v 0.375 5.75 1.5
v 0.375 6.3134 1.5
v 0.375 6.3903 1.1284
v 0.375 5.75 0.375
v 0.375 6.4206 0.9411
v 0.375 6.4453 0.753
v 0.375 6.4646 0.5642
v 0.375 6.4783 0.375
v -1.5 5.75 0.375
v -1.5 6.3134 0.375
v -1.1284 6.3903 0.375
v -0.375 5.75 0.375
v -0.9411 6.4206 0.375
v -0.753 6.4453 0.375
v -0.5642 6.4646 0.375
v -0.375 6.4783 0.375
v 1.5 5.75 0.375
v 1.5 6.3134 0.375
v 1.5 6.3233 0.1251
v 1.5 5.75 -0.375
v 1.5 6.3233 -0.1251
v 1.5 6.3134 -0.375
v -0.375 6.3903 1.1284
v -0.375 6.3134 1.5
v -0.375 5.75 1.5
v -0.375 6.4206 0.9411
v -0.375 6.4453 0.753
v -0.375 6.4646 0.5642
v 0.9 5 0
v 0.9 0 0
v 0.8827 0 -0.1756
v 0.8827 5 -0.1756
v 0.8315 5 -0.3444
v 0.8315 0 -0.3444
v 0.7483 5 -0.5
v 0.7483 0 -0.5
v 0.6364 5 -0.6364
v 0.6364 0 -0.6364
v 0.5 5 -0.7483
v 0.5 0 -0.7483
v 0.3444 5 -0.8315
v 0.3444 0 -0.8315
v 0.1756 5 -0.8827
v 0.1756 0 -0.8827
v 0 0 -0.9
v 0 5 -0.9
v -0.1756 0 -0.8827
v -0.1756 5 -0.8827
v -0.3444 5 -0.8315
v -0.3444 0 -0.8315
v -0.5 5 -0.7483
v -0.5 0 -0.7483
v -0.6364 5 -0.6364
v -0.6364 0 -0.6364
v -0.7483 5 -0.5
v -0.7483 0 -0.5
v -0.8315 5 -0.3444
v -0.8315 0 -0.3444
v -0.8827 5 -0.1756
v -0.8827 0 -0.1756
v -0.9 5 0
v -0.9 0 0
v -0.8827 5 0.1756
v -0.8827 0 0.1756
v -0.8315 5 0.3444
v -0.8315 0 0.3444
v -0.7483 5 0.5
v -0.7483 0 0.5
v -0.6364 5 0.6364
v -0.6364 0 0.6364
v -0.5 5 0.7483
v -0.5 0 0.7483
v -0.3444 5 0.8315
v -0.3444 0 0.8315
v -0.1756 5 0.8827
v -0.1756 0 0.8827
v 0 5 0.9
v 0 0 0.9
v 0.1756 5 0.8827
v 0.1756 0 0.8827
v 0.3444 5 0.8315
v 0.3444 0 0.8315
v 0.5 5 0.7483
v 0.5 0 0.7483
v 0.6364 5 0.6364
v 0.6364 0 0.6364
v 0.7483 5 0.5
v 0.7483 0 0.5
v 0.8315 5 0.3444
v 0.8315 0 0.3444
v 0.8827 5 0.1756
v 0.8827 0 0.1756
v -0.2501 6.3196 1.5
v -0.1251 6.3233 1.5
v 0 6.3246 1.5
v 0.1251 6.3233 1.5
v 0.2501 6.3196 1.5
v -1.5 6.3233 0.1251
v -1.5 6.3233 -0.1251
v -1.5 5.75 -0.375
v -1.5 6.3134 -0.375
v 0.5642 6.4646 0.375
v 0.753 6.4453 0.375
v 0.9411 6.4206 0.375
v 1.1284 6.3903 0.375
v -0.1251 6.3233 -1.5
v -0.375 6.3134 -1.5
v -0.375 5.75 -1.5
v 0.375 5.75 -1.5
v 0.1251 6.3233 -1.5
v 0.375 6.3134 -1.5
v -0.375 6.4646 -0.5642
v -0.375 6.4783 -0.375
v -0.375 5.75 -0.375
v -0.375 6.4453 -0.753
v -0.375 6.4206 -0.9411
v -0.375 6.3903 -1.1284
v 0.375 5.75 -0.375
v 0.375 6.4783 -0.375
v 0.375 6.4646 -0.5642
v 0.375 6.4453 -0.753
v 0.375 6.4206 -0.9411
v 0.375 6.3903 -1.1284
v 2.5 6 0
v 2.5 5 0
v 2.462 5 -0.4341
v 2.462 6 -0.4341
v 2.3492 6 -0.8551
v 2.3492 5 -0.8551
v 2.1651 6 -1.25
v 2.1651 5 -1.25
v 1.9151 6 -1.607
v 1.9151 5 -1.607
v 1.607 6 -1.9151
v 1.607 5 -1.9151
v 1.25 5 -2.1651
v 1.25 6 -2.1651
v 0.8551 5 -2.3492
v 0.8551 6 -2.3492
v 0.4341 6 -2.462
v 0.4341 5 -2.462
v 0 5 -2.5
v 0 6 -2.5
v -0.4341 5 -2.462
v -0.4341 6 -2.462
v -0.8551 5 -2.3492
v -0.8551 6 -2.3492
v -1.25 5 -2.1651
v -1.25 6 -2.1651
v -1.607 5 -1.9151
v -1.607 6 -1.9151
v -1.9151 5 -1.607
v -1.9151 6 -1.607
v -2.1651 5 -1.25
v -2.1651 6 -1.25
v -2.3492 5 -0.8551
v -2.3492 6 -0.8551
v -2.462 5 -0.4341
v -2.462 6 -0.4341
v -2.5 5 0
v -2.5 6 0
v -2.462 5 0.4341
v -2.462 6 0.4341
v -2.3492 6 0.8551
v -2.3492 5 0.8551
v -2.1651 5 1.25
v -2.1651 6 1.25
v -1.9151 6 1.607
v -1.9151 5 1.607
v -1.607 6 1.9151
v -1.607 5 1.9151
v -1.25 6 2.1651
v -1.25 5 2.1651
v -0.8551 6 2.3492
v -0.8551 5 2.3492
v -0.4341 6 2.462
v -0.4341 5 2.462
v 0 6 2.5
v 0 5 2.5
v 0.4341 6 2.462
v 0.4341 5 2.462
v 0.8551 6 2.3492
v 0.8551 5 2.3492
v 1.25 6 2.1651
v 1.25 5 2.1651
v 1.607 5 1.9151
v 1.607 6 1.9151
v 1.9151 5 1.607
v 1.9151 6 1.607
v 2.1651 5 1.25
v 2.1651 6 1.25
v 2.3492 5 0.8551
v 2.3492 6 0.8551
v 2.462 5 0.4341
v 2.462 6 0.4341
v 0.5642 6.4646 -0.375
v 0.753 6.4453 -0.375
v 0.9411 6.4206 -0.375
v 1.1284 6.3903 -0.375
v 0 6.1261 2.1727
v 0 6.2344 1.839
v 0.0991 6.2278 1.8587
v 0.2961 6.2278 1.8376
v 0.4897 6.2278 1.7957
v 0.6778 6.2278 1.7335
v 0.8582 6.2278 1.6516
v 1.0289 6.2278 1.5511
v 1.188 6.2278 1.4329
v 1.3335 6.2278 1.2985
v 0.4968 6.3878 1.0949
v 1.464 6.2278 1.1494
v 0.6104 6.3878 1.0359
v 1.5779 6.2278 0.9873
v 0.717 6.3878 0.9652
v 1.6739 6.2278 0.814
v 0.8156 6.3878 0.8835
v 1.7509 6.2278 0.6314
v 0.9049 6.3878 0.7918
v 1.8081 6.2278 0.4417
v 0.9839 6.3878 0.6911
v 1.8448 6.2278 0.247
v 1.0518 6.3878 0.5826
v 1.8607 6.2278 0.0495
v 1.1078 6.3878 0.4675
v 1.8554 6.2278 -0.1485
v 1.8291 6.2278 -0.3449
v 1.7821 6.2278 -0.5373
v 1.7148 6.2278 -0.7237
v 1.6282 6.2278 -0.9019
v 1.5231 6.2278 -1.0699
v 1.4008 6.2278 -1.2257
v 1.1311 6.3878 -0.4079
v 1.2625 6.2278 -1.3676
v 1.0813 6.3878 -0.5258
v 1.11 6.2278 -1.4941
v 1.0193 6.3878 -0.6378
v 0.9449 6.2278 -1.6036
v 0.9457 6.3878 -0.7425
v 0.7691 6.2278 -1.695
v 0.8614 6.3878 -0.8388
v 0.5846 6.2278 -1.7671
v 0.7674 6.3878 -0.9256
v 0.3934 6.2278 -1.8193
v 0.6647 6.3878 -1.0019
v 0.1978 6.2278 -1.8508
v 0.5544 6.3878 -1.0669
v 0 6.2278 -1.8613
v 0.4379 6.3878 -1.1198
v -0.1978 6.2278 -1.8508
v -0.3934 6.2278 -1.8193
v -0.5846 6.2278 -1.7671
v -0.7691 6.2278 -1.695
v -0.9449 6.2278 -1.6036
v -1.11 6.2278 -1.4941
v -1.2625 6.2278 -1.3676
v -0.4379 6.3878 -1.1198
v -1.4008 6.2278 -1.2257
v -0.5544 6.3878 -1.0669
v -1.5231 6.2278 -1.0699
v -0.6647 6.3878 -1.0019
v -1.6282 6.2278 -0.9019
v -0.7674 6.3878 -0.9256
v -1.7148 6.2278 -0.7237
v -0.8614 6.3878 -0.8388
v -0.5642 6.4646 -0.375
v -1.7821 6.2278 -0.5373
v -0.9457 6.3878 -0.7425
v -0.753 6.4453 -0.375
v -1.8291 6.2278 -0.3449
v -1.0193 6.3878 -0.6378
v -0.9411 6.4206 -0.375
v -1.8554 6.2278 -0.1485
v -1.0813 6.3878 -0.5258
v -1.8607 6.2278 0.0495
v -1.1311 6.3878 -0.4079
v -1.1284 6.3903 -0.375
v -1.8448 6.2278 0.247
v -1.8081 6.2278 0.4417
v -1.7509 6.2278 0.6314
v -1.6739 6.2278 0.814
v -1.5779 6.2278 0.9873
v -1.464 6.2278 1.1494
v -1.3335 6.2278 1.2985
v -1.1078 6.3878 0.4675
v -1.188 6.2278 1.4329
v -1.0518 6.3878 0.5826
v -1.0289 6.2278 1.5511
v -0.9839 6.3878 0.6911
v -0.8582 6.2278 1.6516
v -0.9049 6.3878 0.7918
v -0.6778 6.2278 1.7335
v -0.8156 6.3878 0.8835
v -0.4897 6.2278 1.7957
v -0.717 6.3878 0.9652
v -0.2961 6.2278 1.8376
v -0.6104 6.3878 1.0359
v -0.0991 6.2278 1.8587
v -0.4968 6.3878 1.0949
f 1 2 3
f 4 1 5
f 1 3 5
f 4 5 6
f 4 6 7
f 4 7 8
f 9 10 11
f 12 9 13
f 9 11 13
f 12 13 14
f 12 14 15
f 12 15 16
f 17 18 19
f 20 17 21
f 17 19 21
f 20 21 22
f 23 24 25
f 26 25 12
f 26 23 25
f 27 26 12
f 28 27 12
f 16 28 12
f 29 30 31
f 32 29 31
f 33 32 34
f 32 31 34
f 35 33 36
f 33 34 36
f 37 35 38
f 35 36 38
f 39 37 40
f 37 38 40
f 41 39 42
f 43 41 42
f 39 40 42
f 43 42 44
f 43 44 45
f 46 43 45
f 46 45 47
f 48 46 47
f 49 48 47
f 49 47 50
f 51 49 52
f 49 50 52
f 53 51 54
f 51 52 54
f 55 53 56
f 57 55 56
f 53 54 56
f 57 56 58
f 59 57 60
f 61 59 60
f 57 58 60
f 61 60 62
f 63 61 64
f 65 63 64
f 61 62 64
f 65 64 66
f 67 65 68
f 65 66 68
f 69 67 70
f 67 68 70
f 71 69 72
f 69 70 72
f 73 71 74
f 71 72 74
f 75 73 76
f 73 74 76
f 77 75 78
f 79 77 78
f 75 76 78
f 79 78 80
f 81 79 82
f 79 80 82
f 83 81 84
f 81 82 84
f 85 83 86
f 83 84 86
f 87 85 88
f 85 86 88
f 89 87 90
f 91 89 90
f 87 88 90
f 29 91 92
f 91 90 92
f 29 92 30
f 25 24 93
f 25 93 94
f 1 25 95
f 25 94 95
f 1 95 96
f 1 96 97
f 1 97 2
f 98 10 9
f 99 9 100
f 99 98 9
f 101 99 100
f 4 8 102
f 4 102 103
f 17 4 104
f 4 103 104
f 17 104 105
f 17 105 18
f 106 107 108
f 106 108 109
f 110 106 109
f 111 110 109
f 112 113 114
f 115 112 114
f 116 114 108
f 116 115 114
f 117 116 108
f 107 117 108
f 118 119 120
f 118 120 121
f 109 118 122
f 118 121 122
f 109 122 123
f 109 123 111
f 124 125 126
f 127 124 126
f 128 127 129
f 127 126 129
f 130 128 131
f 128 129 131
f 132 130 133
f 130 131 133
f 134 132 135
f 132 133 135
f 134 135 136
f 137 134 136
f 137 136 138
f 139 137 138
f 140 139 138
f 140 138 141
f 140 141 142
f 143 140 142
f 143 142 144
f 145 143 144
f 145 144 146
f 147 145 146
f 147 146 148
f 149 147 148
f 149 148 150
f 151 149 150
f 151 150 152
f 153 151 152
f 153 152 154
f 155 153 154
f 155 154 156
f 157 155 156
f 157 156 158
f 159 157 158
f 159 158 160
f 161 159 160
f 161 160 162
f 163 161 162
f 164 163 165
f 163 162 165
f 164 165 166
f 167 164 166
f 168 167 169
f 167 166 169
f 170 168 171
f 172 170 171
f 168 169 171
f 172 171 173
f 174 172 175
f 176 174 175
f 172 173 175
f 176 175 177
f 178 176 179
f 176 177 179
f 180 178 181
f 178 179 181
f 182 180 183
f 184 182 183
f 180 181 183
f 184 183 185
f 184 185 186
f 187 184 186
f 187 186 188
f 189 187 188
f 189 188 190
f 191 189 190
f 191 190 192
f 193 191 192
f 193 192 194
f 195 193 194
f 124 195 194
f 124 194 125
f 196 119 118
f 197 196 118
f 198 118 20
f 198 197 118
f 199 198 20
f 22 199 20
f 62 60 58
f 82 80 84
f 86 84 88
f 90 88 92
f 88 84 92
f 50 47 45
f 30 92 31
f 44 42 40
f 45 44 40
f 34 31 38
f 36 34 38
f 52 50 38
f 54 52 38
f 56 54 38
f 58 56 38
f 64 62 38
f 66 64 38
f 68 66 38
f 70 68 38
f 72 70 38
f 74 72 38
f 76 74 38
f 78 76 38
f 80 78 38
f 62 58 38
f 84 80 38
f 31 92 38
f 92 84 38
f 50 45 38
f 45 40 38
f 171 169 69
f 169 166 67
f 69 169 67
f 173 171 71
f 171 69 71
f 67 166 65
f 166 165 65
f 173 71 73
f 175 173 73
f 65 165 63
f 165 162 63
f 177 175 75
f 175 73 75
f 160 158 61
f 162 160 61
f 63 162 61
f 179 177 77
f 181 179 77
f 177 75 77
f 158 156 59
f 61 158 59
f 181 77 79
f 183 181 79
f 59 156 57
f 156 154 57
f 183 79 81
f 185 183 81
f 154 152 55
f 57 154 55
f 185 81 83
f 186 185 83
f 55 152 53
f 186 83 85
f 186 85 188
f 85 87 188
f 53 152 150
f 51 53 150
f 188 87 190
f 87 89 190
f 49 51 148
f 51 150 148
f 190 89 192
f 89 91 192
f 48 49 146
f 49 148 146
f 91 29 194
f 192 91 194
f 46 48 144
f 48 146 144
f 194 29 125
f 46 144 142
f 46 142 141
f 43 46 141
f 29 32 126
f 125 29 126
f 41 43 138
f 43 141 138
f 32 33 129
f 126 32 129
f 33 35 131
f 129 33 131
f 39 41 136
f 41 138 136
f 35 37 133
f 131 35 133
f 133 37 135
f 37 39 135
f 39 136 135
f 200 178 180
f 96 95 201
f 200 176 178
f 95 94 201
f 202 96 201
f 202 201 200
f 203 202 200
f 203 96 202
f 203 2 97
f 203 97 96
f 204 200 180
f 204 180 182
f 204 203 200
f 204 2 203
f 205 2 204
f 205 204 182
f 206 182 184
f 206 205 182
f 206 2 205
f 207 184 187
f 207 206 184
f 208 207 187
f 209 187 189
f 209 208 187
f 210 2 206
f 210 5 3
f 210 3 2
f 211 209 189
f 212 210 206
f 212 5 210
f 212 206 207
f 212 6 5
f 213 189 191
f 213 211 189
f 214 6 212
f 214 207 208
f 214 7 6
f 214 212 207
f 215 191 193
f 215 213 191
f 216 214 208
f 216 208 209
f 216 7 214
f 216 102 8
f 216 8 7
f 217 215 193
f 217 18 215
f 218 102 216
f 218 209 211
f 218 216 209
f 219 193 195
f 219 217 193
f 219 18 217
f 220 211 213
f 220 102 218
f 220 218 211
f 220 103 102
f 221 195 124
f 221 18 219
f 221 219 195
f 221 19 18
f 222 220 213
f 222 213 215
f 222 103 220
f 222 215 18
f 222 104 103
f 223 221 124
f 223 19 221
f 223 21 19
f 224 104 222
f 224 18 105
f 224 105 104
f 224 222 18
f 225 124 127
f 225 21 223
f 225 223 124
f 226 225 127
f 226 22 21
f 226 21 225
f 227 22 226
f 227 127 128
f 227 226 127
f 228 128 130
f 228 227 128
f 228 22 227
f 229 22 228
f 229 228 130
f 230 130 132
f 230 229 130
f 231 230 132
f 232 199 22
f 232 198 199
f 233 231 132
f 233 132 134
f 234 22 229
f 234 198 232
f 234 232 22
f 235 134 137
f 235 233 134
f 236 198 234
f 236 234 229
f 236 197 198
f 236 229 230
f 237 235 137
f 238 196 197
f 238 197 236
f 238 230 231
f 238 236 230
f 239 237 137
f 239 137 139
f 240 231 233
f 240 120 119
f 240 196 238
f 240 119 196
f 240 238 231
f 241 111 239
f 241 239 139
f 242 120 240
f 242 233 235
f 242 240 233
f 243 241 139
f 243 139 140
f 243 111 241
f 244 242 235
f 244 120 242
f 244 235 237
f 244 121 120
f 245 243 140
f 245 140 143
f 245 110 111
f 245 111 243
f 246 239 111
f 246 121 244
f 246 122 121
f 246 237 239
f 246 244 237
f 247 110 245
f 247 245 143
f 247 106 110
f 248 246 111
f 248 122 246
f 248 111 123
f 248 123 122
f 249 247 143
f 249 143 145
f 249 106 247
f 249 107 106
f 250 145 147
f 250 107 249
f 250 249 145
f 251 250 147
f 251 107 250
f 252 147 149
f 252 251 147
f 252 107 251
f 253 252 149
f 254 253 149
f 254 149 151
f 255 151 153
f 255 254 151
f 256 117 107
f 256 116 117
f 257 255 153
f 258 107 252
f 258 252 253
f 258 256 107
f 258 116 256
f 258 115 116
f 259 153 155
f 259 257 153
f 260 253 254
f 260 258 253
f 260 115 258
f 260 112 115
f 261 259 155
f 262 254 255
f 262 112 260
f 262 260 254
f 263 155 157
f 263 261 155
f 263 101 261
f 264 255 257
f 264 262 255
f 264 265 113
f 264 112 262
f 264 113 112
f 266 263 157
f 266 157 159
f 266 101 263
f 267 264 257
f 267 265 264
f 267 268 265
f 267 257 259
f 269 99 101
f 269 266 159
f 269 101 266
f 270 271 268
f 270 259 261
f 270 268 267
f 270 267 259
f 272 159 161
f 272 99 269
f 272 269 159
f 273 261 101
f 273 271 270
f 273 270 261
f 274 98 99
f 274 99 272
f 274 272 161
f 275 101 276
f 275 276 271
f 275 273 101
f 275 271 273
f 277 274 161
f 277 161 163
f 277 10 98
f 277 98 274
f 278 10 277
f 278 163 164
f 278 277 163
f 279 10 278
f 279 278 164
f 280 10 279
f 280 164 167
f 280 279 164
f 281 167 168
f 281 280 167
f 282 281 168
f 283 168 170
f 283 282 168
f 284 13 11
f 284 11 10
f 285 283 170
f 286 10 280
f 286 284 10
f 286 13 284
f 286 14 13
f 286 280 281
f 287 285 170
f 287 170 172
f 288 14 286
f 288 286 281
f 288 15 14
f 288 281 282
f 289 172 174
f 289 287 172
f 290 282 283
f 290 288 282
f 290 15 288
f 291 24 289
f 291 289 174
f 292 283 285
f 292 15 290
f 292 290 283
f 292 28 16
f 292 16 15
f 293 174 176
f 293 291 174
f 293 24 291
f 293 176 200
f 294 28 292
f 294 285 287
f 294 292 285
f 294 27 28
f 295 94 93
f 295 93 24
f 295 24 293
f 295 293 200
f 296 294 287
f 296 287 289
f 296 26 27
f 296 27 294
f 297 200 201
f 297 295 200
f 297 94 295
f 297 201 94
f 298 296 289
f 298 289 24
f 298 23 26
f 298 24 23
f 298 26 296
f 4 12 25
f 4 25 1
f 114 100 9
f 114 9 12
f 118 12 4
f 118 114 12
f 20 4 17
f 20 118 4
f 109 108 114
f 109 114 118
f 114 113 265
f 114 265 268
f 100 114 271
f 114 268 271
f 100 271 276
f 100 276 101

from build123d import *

# Parameters (mm, degrees)
SKETCH1_R           = 0.9
BOSS_EXTRUDE1_DEPTH = 5
SKETCH2_R           = 2.5
BOSS_EXTRUDE2_DEPTH = 1
DOME1_FACE_RADIUS   = 2.5
DOME1_HEIGHT        = 0.5
SKETCH3_W           = 1.125
SKETCH3_H           = 0.75
SKETCH3_W_2         = 0.75
SKETCH3_H_2         = 1.125
CUT_EXTRUDE1_DEPTH  = 0.75


with BuildPart() as part:
    # Sketch1 → Boss-Extrude1 (new body)
    with BuildSketch(Plane(origin=(0, 0, 0), x_dir=(1, 0, 0), z_dir=(0, 1, 0))):
        Circle(SKETCH1_R)
    extrude(amount=BOSS_EXTRUDE1_DEPTH)

    # Sketch2 → Boss-Extrude2 (add)
    with BuildSketch(Plane(origin=(0, 5, 0), x_dir=(1, 0, 0), z_dir=(0, 1, 0))):
        Circle(SKETCH2_R)
    extrude(amount=BOSS_EXTRUDE2_DEPTH)

    # Dome1: a dome of height H over a round flat face of radius A is a cap of a sphere of radius (A * A + H * H) / (2 * H)
    dome1_r = (DOME1_FACE_RADIUS * DOME1_FACE_RADIUS + DOME1_HEIGHT * DOME1_HEIGHT) / (2 * DOME1_HEIGHT)
    dome1_base = Plane((0, 6, 0), z_dir=(0, 1, 0))
    with Locations(dome1_base.offset(DOME1_HEIGHT - dome1_r)):
        dome1_ball = Sphere(dome1_r, mode=Mode.PRIVATE)
    add(split(dome1_ball, bisect_by=dome1_base, keep=Keep.TOP, mode=Mode.PRIVATE))

    # Sketch3 → Cut-Extrude1 (cut)
    with BuildSketch(Plane(origin=(0, 6.5, 0), x_dir=(1, 0, 0), z_dir=(0, 1, 0))):
        with Locations((-0.9375, 0)):
            Rectangle(SKETCH3_W, SKETCH3_H)
        Rectangle(SKETCH3_W_2, SKETCH3_H)
        with Locations((0, 0.9375)):
            Rectangle(SKETCH3_W_2, SKETCH3_H_2)
        with Locations((0.9375, 0)):
            Rectangle(SKETCH3_W, SKETCH3_H)
        with Locations((0, -0.9375)):
            Rectangle(SKETCH3_W_2, SKETCH3_H_2)
    extrude(amount=-CUT_EXTRUDE1_DEPTH, mode=Mode.SUBTRACT)


solid = part.part
